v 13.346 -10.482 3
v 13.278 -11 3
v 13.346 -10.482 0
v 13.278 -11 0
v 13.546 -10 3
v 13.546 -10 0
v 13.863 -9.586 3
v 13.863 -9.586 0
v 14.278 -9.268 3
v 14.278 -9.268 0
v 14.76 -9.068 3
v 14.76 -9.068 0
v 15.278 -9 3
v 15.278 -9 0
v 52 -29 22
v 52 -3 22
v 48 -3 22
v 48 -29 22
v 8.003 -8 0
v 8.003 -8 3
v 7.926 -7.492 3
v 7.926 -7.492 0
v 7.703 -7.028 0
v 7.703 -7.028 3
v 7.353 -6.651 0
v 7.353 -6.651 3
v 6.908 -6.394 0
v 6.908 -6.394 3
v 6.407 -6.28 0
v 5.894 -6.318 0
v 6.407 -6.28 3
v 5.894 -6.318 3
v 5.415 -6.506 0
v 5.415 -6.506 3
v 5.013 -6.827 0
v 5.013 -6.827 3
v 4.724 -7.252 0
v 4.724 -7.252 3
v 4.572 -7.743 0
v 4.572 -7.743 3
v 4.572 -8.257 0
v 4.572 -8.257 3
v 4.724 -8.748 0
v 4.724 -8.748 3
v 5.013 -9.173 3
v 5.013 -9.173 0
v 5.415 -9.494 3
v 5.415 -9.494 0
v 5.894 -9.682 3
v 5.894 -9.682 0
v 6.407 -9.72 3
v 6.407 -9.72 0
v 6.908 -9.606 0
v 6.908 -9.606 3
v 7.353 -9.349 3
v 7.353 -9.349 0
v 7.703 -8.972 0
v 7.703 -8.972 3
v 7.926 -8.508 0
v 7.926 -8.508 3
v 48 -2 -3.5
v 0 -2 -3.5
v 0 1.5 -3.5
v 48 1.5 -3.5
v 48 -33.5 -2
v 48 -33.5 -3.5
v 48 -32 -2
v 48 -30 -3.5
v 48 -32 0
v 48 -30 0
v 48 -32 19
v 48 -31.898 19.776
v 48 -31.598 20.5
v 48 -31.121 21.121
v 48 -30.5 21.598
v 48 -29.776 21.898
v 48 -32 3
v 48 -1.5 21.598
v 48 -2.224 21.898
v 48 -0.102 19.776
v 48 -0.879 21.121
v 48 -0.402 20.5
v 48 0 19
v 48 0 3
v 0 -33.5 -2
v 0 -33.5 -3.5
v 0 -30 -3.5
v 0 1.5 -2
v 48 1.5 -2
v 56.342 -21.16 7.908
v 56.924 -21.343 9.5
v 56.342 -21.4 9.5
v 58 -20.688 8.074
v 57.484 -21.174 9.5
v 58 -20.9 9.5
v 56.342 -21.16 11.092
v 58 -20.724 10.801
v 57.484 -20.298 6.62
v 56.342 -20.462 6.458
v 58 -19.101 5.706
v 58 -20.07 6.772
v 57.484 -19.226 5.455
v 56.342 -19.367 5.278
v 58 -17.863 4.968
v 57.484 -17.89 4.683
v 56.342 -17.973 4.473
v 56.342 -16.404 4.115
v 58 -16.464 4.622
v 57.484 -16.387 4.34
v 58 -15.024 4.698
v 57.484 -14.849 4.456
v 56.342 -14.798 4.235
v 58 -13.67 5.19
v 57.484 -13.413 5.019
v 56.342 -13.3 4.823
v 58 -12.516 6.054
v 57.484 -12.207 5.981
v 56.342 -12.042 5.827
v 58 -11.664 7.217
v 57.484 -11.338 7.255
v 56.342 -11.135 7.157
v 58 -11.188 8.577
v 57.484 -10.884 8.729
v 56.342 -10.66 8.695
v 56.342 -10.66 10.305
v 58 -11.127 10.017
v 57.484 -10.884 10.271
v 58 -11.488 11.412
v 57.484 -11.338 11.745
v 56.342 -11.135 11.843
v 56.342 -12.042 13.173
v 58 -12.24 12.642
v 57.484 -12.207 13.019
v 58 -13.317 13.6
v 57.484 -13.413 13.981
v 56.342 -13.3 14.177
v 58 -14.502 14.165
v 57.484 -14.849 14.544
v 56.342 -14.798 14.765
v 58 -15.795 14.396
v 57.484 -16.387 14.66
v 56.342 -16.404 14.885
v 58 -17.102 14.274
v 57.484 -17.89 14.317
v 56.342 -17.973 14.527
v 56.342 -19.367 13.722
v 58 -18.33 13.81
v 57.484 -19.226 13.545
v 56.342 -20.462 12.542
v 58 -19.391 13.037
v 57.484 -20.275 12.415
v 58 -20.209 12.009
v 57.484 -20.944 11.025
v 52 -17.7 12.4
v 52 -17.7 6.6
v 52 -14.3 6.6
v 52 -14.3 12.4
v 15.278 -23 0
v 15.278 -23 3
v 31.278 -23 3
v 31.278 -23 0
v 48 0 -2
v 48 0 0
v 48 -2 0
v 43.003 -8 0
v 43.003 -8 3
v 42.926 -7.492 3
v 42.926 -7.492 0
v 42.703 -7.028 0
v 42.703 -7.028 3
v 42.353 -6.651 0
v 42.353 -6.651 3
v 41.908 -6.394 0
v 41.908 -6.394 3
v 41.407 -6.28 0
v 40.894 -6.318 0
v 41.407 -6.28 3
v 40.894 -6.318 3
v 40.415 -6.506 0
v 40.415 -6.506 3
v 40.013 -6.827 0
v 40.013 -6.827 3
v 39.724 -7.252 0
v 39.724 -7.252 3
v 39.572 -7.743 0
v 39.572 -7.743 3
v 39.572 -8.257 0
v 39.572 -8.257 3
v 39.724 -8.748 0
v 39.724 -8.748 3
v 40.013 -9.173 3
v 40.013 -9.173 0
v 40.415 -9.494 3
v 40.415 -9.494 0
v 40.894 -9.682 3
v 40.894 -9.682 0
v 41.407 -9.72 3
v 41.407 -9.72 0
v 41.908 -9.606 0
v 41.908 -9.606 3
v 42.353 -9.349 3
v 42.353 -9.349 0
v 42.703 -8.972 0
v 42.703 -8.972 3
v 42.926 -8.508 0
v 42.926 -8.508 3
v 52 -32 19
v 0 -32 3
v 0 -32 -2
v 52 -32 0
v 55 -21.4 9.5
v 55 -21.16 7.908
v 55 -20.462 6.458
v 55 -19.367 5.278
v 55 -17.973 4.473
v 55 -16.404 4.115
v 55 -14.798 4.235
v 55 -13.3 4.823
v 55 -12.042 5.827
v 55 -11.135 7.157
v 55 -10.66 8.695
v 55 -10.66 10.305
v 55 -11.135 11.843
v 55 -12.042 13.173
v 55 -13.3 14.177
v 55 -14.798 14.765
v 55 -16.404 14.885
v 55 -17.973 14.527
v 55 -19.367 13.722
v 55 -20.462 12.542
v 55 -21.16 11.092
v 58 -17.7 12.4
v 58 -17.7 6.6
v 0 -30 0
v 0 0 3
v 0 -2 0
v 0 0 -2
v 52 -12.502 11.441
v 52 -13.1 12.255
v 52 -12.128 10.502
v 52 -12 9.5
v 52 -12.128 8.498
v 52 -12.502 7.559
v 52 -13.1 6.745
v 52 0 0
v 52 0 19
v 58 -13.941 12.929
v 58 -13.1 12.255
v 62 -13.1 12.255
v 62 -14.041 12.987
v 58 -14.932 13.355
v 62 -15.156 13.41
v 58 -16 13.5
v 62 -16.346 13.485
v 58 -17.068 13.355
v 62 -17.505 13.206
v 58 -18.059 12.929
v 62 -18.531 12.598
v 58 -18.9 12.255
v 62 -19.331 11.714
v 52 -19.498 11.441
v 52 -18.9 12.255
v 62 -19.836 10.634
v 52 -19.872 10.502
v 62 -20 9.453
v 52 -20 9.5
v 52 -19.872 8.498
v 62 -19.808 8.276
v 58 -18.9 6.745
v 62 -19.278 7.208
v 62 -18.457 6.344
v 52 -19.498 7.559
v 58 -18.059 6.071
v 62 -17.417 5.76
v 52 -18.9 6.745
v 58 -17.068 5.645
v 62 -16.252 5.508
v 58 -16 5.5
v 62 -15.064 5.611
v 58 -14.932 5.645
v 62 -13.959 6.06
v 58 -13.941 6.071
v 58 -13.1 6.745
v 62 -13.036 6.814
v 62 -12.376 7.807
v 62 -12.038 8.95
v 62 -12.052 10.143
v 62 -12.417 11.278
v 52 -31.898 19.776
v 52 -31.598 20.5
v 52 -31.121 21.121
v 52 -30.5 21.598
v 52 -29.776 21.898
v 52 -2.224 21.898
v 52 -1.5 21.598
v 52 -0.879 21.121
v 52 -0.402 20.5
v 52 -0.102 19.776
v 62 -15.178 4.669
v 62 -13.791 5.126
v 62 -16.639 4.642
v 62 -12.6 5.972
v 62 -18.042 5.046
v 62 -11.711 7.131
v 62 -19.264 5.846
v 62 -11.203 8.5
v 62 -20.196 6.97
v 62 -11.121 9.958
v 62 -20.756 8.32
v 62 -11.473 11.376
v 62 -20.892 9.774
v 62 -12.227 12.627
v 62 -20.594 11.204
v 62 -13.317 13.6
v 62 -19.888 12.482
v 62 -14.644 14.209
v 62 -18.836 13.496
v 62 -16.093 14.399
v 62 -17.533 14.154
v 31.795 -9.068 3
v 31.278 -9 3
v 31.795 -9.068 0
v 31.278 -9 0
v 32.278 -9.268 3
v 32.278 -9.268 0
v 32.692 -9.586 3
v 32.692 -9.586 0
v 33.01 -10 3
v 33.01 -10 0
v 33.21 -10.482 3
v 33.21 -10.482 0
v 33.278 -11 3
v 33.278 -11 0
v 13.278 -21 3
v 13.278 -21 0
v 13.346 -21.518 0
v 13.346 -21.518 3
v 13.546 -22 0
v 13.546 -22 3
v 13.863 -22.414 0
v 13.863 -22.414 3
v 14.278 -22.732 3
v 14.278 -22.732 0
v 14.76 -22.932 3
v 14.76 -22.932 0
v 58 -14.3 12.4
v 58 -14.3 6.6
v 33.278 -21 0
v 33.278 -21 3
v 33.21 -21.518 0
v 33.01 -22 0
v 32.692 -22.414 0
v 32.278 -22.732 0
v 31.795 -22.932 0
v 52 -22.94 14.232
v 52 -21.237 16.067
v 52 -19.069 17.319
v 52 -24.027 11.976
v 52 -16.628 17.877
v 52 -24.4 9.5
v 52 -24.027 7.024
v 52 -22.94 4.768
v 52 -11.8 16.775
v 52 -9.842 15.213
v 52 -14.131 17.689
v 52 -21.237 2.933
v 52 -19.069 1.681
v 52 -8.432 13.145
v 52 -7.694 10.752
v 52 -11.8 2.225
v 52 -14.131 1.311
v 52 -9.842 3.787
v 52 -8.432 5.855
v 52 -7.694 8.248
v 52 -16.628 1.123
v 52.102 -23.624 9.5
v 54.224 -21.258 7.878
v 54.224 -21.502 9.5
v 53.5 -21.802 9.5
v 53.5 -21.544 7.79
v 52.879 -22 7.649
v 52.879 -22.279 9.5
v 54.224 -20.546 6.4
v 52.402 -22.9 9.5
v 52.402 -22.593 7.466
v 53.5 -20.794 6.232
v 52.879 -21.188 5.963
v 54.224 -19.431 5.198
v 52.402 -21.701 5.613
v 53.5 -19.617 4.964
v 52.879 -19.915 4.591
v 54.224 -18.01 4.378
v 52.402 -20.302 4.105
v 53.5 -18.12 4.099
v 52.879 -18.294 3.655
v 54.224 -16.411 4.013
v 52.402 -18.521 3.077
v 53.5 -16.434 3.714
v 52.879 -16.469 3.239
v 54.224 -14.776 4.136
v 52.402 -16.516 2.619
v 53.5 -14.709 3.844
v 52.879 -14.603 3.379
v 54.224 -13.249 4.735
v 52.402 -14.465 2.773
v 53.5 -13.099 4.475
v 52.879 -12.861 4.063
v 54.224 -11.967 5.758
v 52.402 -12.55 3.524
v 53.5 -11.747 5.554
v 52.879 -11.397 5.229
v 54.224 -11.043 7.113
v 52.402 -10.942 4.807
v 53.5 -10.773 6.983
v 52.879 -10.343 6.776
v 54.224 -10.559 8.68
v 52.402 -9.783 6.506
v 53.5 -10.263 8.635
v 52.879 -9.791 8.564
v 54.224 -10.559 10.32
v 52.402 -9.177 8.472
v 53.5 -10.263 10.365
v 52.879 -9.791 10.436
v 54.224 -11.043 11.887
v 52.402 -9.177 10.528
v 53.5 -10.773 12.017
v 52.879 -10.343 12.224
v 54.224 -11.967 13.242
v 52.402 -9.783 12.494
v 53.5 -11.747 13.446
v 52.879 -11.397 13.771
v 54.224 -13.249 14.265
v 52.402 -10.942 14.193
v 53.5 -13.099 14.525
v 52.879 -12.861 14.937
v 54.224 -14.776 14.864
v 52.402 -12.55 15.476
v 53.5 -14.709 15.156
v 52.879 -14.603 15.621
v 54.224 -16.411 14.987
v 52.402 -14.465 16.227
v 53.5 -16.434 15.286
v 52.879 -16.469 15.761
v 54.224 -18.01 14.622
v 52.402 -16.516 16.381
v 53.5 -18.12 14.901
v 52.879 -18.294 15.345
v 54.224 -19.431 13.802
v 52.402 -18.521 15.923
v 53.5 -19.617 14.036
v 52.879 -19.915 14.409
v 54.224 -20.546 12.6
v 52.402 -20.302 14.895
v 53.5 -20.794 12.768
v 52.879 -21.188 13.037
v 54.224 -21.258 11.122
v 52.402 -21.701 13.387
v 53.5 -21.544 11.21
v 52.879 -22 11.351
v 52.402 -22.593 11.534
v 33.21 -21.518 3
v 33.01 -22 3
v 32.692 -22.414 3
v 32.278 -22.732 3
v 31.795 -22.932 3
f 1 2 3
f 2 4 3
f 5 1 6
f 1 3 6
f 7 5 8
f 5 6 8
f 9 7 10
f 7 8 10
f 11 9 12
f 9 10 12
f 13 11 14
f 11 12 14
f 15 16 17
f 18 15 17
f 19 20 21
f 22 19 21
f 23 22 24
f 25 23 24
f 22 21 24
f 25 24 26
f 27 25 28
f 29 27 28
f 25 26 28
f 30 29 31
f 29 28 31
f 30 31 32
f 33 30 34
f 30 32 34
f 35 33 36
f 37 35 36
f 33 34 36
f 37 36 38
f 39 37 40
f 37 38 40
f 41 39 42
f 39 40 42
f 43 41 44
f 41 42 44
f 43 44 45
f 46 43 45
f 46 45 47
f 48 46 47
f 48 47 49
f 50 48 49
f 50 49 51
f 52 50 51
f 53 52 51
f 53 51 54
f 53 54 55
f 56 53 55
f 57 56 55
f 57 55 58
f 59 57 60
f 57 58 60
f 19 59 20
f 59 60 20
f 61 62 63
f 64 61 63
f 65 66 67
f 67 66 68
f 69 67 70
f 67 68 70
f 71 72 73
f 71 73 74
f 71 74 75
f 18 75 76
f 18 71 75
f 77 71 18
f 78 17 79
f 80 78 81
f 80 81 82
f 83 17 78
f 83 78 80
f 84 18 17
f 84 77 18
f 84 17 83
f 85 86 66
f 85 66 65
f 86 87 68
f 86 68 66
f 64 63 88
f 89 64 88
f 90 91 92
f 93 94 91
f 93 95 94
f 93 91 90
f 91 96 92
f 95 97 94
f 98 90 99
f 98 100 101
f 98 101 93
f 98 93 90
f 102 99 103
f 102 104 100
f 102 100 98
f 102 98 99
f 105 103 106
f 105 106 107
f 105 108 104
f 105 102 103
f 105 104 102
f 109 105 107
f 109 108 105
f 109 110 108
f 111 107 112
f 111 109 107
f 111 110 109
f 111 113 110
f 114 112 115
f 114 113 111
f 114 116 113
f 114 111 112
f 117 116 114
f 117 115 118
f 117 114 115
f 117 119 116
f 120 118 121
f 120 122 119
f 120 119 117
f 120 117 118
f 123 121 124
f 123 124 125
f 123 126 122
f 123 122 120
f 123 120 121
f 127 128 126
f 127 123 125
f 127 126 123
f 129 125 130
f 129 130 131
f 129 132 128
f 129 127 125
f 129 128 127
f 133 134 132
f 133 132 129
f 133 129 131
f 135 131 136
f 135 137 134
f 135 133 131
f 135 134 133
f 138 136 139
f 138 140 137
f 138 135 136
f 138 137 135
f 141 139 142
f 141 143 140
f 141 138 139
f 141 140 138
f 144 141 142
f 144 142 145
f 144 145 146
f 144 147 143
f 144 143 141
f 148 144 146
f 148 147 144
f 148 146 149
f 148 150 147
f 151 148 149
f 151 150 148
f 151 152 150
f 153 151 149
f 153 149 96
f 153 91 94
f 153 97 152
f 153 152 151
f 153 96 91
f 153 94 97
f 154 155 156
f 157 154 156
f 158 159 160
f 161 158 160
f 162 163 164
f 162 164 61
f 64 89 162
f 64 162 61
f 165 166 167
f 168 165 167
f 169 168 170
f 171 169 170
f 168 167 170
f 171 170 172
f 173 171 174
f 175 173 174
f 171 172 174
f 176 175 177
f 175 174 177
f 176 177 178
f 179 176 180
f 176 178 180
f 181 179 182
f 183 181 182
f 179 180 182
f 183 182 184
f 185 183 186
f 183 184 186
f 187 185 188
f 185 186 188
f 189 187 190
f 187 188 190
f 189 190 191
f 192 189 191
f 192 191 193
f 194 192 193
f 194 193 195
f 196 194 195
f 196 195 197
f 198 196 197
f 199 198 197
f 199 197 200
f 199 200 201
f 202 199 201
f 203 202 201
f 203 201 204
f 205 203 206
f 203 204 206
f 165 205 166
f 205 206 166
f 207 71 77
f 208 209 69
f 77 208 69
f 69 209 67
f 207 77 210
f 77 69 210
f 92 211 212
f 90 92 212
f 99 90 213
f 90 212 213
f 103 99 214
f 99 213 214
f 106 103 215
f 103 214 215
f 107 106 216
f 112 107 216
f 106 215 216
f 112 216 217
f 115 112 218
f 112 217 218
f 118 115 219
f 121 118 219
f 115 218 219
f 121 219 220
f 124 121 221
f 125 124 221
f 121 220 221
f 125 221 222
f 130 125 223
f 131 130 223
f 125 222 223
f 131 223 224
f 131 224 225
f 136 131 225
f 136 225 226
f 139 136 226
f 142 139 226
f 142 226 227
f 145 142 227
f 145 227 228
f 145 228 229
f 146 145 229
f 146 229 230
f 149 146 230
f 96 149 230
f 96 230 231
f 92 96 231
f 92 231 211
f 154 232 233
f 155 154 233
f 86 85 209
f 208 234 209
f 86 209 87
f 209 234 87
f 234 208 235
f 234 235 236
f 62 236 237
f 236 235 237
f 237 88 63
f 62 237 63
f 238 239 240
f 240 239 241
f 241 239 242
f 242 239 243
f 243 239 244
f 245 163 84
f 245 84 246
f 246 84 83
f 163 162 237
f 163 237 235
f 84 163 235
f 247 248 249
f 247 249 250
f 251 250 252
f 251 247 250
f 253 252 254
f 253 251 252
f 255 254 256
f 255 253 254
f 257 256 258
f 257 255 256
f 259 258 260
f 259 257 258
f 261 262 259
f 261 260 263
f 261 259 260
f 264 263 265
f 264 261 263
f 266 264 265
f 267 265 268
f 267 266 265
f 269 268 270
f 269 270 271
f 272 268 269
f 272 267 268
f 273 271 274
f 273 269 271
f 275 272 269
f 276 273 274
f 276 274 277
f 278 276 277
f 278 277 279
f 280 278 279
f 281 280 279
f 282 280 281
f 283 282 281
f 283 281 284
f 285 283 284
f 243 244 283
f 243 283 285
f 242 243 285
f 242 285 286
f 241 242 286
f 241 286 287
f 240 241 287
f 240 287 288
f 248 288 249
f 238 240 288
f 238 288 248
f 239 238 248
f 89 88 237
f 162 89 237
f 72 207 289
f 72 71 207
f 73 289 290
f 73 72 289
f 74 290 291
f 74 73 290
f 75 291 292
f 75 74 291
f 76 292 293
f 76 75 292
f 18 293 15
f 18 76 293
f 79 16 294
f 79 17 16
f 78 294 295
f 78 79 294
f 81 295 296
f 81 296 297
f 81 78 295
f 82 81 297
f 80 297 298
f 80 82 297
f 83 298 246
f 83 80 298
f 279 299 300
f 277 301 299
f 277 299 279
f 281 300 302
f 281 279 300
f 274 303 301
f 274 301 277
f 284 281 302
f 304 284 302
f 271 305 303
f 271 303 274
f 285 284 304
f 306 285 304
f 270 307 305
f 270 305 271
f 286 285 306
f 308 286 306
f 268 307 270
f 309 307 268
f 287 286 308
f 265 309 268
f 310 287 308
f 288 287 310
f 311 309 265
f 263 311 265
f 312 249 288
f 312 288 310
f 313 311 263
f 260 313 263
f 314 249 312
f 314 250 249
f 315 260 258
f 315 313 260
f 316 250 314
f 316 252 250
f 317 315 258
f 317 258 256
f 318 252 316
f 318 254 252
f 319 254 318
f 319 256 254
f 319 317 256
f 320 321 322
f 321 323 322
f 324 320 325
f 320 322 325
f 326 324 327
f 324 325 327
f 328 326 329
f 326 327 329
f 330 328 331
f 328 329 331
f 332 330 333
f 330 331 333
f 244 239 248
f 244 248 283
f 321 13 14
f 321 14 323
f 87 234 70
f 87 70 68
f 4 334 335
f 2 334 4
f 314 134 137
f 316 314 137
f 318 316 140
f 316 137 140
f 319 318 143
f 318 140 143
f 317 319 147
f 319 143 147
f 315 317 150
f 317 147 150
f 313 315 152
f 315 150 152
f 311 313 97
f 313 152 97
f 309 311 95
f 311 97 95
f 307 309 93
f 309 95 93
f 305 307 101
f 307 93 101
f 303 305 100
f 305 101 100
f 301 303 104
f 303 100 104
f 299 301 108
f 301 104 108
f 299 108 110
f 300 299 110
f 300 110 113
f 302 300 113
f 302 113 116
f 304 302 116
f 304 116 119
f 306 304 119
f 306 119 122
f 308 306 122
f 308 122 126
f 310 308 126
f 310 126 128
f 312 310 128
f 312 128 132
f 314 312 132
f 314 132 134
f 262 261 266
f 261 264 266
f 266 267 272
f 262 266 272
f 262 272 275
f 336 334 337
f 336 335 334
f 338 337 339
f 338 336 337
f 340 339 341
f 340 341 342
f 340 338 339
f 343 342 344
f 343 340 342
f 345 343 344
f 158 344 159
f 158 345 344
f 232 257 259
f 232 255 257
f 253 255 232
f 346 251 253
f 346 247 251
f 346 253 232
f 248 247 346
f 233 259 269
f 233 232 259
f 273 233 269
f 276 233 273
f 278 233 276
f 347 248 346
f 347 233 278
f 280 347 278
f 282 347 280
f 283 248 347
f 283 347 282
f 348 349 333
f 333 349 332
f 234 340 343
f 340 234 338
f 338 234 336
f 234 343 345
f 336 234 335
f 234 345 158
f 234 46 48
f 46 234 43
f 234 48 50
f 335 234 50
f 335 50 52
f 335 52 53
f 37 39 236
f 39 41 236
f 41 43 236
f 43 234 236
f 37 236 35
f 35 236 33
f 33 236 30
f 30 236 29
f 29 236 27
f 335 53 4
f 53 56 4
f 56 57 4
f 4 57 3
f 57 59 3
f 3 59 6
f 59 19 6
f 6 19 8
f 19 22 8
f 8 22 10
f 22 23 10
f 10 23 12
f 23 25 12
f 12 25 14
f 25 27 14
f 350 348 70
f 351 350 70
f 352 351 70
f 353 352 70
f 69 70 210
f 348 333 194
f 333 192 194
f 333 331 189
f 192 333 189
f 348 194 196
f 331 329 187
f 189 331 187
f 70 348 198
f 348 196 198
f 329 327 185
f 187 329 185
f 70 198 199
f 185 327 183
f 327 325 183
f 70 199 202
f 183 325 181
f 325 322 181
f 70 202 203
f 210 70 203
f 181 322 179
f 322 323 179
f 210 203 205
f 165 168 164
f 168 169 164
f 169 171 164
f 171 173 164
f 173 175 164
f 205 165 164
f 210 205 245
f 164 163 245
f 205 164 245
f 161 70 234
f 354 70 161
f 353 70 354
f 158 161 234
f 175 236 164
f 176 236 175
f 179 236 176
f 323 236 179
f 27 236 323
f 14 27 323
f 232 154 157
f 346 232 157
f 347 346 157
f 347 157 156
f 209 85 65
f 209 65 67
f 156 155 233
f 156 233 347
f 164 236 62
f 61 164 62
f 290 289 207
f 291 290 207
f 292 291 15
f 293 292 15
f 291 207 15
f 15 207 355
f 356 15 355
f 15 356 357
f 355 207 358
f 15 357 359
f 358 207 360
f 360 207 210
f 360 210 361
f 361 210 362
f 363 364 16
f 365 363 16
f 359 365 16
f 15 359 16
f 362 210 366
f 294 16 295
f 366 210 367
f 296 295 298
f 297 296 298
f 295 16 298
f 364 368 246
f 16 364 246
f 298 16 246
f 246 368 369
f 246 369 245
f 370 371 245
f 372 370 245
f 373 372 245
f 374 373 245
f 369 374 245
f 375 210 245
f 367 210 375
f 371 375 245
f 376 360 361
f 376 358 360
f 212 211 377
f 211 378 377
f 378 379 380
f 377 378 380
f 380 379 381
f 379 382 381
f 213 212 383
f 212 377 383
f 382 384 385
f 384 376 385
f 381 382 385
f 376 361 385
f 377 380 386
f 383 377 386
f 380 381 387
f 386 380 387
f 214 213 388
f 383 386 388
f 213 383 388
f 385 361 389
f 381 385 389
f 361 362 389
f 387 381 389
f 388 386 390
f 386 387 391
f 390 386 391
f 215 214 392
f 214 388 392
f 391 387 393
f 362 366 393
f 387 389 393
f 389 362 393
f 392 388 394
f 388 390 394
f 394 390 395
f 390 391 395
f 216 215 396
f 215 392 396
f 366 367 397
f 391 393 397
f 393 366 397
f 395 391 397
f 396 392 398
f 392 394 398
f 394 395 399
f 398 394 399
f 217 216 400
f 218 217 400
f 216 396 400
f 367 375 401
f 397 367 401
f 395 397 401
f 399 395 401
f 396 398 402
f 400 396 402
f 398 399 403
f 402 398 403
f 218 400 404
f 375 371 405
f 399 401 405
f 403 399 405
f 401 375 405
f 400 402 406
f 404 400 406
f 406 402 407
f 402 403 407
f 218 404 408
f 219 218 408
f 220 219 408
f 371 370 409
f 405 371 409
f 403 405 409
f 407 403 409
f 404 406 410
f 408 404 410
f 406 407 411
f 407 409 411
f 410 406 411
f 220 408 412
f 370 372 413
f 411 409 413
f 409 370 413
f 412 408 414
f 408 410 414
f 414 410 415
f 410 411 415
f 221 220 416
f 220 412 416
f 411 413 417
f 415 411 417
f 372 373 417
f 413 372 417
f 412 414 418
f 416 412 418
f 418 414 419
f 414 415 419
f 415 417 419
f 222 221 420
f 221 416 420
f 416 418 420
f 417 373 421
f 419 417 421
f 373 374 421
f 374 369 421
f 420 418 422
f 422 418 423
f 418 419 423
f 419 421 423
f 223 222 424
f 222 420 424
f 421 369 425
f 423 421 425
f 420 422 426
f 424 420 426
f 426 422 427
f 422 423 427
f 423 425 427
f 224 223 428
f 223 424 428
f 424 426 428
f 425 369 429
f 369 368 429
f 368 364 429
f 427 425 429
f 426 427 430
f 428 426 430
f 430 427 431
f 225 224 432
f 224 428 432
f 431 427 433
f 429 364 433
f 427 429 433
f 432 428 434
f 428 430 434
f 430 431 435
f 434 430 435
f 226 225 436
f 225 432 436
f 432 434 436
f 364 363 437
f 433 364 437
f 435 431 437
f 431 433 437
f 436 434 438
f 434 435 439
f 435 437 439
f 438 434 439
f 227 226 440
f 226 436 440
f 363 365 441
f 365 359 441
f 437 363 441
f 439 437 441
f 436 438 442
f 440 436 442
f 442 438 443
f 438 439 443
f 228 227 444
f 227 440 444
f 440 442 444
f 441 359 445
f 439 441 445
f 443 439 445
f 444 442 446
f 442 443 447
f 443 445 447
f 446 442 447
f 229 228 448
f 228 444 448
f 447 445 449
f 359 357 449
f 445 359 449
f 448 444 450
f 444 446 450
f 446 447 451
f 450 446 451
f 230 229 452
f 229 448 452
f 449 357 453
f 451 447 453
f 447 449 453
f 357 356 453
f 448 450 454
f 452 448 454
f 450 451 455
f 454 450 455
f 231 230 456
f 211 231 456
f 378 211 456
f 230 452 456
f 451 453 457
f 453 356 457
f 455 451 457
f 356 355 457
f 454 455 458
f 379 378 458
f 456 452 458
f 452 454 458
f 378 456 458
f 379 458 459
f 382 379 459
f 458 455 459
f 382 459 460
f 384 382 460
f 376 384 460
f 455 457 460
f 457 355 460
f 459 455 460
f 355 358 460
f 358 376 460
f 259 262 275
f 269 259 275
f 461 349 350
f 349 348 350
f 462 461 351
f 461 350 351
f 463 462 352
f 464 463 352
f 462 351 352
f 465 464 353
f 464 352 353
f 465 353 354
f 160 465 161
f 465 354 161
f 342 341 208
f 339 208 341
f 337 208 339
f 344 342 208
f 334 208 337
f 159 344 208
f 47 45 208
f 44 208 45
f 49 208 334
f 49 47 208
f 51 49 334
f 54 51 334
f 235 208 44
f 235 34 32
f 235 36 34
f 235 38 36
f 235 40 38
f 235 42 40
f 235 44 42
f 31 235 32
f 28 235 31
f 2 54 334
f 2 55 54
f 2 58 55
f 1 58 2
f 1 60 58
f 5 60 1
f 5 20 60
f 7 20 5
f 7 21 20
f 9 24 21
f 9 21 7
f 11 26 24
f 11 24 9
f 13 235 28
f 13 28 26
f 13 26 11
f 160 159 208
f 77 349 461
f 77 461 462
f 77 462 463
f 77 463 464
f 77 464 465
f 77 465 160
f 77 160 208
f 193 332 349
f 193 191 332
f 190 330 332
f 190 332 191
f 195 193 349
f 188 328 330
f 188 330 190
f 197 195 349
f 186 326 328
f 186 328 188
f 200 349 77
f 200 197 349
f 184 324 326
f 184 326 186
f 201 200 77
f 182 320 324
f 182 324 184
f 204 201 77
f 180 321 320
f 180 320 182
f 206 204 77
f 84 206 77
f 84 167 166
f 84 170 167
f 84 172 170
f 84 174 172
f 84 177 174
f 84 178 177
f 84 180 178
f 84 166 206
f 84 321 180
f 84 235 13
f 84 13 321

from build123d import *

# Parameters (mm, degrees)
SKETCH1_W           = 52
SKETCH1_H           = 32
BOSS_EXTRUDE1_DEPTH = 3
SKETCH2_W           = 4
SKETCH2_H           = 32
BOSS_EXTRUDE2_DEPTH = 20
FILLET1_R           = 3
SKETCH4_R           = 1.725
CUT_EXTRUDE2_DEPTH  = 3
SKETCH6_W           = 20
SKETCH6_H           = 14
CUT_EXTRUDE3_DEPTH  = 3
SKETCH7_W           = 8.2
SKETCH7_H           = 5.8
SKETCH7_W_2         = 5.8
SKETCH7_H_2         = 3.4
BOSS_EXTRUDE4_DEPTH = 6
SKETCH10_R          = 4.9
SKETCH10_R_2        = 4
BOSS_EXTRUDE6_DEPTH = 10
SKETCH8_R           = 5.4
SKETCH8_R_2         = 4.25
BOSS_EXTRUDE5_DEPTH = 6
FILLET2_R           = 2
FILLET3_R           = 3
BOSS_EXTRUDE7_DEPTH = 48


with BuildPart() as part:
    # Sketch1 → Boss-Extrude1 (new body)
    with BuildSketch(Plane.XY):
        with Locations((26, -16)):
            Rectangle(SKETCH1_W, SKETCH1_H)
    extrude(amount=BOSS_EXTRUDE1_DEPTH)

    # Sketch2 → Boss-Extrude2 (add)
    with BuildSketch(Plane(origin=(0, 0, 2), x_dir=(-1, 0, 0), z_dir=(0, 0, -1))):
        with Locations((-50, -16)):
            Rectangle(SKETCH2_W, SKETCH2_H)
    extrude(amount=-BOSS_EXTRUDE2_DEPTH)

    # Fillet1
    fillet1_edges = [part.edges().sort_by_distance(p)[0] for p in [
        (50, -32, 22),
        (50, 0, 22),
    ]]
    fillet(fillet1_edges, radius=FILLET1_R)

    # Sketch4 → Cut-Extrude2 (cut)
    with BuildSketch(Plane.XY.offset(3)):
        with Locations((41.277695867, -8)):
            Circle(SKETCH4_R)
        with Locations((6.277695867, -8)):
            Circle(SKETCH4_R)
    extrude(amount=-CUT_EXTRUDE2_DEPTH, mode=Mode.SUBTRACT)

    # Sketch6 → Cut-Extrude3 (cut)
    with BuildSketch(Plane.XY.offset(3)):
        with Locations((23.277695867, -16)):
            Rectangle(SKETCH6_W, SKETCH6_H)
    extrude(amount=-CUT_EXTRUDE3_DEPTH, mode=Mode.SUBTRACT)

    # Sketch7 → Boss-Extrude4 (add)
    with BuildSketch(Plane(origin=(52, 0, 0), x_dir=(0, 0, -1), z_dir=(1, 0, 0))):
        with Locations((-9.5, -16)):
            Rectangle(SKETCH7_W, SKETCH7_H)
        with Locations((-9.5, -16)):
            Rectangle(SKETCH7_W_2, SKETCH7_H_2, mode=Mode.SUBTRACT)
    extrude(amount=BOSS_EXTRUDE4_DEPTH)

    # Sketch10 → Boss-Extrude6 (add)
    with BuildSketch(Plane(origin=(52, 0, 0), x_dir=(0, 0, -1), z_dir=(1, 0, 0))):
        with Locations(Location((-9.5, -16, 0), (0, 0, 146.796900802))):
            Circle(SKETCH10_R)
        with Locations(Location((-9.5, -16, 0), (0, 0, 133.531152167))):
            Circle(SKETCH10_R_2, mode=Mode.SUBTRACT)
    extrude(amount=BOSS_EXTRUDE6_DEPTH)

    # Sketch8 → Boss-Extrude5 (add)
    with BuildSketch(Plane(origin=(52, 0, 0), x_dir=(0, 0, -1), z_dir=(1, 0, 0))):
        with Locations(Location((-9.5, -16, 0), (0, 0, 270))):
            Circle(SKETCH8_R)
        with Locations((-9.5, -16)):
            Circle(SKETCH8_R_2, mode=Mode.SUBTRACT)
    extrude(amount=BOSS_EXTRUDE5_DEPTH)

    # Fillet2
    fillet2_edges = [part.edges().sort_by_distance(p)[0] for p in [
        (33.277695867, -9, 1.5),
        (33.277695867, -23, 1.5),
        (13.277695867, -23, 1.5),
        (13.277695867, -9, 1.5),
    ]]
    fillet(fillet2_edges, radius=FILLET2_R)

    # Fillet3
    # the kernel refuses this fillet: 3 mm, written as the material it adds along each edge
    with BuildSketch(Plane(origin=(52, -16, 9.5), x_dir=(0, -1, 0), z_dir=(0, 0, 1))) as fillet3_piece_1:
        with BuildLine():
            CenterArc((5.4 + FILLET3_R, FILLET3_R), FILLET3_R, 180, 90)
            Line((5.4, FILLET3_R), (5.4, 0))
            Line((5.4, 0), (5.4 + FILLET3_R, 0))
        make_face()
    revolve(axis=Axis((52, -16, 9.5), (1, 0, 0)))
    # the kernel refuses this fillet: 3 mm, written as the material it takes off along each edge
    with BuildSketch(Plane(origin=(58, -16, 9.5), x_dir=(0, -1, 0), z_dir=(0, 0, 1))) as fillet3_2_piece_1:
        with BuildLine():
            CenterArc((2.4, -1.658312395), FILLET3_R, 0, 33.557309762)
            Line((4.9, 0), (5.4, 0))
            Line((5.4, 0), (5.4, -1.658312395))
        make_face()
    revolve(axis=Axis((58, -16, 9.5), (1, 0, 0)), mode=Mode.SUBTRACT)

    # Sketch15 → Boss-Extrude7 (add)
    with BuildSketch(Plane.ZY):
        Polygon((-3.5, -2), (-3.5, 1.5), (-2, 1.5), (-2, 0), (0, 0), (0, -2), align=None)
        Polygon((-3.5, -33.5), (-2, -33.5), (-2, -32), (0, -32), (0, -30), (-3.5, -30), align=None)
    extrude(amount=-BOSS_EXTRUDE7_DEPTH)


solid = part.part
